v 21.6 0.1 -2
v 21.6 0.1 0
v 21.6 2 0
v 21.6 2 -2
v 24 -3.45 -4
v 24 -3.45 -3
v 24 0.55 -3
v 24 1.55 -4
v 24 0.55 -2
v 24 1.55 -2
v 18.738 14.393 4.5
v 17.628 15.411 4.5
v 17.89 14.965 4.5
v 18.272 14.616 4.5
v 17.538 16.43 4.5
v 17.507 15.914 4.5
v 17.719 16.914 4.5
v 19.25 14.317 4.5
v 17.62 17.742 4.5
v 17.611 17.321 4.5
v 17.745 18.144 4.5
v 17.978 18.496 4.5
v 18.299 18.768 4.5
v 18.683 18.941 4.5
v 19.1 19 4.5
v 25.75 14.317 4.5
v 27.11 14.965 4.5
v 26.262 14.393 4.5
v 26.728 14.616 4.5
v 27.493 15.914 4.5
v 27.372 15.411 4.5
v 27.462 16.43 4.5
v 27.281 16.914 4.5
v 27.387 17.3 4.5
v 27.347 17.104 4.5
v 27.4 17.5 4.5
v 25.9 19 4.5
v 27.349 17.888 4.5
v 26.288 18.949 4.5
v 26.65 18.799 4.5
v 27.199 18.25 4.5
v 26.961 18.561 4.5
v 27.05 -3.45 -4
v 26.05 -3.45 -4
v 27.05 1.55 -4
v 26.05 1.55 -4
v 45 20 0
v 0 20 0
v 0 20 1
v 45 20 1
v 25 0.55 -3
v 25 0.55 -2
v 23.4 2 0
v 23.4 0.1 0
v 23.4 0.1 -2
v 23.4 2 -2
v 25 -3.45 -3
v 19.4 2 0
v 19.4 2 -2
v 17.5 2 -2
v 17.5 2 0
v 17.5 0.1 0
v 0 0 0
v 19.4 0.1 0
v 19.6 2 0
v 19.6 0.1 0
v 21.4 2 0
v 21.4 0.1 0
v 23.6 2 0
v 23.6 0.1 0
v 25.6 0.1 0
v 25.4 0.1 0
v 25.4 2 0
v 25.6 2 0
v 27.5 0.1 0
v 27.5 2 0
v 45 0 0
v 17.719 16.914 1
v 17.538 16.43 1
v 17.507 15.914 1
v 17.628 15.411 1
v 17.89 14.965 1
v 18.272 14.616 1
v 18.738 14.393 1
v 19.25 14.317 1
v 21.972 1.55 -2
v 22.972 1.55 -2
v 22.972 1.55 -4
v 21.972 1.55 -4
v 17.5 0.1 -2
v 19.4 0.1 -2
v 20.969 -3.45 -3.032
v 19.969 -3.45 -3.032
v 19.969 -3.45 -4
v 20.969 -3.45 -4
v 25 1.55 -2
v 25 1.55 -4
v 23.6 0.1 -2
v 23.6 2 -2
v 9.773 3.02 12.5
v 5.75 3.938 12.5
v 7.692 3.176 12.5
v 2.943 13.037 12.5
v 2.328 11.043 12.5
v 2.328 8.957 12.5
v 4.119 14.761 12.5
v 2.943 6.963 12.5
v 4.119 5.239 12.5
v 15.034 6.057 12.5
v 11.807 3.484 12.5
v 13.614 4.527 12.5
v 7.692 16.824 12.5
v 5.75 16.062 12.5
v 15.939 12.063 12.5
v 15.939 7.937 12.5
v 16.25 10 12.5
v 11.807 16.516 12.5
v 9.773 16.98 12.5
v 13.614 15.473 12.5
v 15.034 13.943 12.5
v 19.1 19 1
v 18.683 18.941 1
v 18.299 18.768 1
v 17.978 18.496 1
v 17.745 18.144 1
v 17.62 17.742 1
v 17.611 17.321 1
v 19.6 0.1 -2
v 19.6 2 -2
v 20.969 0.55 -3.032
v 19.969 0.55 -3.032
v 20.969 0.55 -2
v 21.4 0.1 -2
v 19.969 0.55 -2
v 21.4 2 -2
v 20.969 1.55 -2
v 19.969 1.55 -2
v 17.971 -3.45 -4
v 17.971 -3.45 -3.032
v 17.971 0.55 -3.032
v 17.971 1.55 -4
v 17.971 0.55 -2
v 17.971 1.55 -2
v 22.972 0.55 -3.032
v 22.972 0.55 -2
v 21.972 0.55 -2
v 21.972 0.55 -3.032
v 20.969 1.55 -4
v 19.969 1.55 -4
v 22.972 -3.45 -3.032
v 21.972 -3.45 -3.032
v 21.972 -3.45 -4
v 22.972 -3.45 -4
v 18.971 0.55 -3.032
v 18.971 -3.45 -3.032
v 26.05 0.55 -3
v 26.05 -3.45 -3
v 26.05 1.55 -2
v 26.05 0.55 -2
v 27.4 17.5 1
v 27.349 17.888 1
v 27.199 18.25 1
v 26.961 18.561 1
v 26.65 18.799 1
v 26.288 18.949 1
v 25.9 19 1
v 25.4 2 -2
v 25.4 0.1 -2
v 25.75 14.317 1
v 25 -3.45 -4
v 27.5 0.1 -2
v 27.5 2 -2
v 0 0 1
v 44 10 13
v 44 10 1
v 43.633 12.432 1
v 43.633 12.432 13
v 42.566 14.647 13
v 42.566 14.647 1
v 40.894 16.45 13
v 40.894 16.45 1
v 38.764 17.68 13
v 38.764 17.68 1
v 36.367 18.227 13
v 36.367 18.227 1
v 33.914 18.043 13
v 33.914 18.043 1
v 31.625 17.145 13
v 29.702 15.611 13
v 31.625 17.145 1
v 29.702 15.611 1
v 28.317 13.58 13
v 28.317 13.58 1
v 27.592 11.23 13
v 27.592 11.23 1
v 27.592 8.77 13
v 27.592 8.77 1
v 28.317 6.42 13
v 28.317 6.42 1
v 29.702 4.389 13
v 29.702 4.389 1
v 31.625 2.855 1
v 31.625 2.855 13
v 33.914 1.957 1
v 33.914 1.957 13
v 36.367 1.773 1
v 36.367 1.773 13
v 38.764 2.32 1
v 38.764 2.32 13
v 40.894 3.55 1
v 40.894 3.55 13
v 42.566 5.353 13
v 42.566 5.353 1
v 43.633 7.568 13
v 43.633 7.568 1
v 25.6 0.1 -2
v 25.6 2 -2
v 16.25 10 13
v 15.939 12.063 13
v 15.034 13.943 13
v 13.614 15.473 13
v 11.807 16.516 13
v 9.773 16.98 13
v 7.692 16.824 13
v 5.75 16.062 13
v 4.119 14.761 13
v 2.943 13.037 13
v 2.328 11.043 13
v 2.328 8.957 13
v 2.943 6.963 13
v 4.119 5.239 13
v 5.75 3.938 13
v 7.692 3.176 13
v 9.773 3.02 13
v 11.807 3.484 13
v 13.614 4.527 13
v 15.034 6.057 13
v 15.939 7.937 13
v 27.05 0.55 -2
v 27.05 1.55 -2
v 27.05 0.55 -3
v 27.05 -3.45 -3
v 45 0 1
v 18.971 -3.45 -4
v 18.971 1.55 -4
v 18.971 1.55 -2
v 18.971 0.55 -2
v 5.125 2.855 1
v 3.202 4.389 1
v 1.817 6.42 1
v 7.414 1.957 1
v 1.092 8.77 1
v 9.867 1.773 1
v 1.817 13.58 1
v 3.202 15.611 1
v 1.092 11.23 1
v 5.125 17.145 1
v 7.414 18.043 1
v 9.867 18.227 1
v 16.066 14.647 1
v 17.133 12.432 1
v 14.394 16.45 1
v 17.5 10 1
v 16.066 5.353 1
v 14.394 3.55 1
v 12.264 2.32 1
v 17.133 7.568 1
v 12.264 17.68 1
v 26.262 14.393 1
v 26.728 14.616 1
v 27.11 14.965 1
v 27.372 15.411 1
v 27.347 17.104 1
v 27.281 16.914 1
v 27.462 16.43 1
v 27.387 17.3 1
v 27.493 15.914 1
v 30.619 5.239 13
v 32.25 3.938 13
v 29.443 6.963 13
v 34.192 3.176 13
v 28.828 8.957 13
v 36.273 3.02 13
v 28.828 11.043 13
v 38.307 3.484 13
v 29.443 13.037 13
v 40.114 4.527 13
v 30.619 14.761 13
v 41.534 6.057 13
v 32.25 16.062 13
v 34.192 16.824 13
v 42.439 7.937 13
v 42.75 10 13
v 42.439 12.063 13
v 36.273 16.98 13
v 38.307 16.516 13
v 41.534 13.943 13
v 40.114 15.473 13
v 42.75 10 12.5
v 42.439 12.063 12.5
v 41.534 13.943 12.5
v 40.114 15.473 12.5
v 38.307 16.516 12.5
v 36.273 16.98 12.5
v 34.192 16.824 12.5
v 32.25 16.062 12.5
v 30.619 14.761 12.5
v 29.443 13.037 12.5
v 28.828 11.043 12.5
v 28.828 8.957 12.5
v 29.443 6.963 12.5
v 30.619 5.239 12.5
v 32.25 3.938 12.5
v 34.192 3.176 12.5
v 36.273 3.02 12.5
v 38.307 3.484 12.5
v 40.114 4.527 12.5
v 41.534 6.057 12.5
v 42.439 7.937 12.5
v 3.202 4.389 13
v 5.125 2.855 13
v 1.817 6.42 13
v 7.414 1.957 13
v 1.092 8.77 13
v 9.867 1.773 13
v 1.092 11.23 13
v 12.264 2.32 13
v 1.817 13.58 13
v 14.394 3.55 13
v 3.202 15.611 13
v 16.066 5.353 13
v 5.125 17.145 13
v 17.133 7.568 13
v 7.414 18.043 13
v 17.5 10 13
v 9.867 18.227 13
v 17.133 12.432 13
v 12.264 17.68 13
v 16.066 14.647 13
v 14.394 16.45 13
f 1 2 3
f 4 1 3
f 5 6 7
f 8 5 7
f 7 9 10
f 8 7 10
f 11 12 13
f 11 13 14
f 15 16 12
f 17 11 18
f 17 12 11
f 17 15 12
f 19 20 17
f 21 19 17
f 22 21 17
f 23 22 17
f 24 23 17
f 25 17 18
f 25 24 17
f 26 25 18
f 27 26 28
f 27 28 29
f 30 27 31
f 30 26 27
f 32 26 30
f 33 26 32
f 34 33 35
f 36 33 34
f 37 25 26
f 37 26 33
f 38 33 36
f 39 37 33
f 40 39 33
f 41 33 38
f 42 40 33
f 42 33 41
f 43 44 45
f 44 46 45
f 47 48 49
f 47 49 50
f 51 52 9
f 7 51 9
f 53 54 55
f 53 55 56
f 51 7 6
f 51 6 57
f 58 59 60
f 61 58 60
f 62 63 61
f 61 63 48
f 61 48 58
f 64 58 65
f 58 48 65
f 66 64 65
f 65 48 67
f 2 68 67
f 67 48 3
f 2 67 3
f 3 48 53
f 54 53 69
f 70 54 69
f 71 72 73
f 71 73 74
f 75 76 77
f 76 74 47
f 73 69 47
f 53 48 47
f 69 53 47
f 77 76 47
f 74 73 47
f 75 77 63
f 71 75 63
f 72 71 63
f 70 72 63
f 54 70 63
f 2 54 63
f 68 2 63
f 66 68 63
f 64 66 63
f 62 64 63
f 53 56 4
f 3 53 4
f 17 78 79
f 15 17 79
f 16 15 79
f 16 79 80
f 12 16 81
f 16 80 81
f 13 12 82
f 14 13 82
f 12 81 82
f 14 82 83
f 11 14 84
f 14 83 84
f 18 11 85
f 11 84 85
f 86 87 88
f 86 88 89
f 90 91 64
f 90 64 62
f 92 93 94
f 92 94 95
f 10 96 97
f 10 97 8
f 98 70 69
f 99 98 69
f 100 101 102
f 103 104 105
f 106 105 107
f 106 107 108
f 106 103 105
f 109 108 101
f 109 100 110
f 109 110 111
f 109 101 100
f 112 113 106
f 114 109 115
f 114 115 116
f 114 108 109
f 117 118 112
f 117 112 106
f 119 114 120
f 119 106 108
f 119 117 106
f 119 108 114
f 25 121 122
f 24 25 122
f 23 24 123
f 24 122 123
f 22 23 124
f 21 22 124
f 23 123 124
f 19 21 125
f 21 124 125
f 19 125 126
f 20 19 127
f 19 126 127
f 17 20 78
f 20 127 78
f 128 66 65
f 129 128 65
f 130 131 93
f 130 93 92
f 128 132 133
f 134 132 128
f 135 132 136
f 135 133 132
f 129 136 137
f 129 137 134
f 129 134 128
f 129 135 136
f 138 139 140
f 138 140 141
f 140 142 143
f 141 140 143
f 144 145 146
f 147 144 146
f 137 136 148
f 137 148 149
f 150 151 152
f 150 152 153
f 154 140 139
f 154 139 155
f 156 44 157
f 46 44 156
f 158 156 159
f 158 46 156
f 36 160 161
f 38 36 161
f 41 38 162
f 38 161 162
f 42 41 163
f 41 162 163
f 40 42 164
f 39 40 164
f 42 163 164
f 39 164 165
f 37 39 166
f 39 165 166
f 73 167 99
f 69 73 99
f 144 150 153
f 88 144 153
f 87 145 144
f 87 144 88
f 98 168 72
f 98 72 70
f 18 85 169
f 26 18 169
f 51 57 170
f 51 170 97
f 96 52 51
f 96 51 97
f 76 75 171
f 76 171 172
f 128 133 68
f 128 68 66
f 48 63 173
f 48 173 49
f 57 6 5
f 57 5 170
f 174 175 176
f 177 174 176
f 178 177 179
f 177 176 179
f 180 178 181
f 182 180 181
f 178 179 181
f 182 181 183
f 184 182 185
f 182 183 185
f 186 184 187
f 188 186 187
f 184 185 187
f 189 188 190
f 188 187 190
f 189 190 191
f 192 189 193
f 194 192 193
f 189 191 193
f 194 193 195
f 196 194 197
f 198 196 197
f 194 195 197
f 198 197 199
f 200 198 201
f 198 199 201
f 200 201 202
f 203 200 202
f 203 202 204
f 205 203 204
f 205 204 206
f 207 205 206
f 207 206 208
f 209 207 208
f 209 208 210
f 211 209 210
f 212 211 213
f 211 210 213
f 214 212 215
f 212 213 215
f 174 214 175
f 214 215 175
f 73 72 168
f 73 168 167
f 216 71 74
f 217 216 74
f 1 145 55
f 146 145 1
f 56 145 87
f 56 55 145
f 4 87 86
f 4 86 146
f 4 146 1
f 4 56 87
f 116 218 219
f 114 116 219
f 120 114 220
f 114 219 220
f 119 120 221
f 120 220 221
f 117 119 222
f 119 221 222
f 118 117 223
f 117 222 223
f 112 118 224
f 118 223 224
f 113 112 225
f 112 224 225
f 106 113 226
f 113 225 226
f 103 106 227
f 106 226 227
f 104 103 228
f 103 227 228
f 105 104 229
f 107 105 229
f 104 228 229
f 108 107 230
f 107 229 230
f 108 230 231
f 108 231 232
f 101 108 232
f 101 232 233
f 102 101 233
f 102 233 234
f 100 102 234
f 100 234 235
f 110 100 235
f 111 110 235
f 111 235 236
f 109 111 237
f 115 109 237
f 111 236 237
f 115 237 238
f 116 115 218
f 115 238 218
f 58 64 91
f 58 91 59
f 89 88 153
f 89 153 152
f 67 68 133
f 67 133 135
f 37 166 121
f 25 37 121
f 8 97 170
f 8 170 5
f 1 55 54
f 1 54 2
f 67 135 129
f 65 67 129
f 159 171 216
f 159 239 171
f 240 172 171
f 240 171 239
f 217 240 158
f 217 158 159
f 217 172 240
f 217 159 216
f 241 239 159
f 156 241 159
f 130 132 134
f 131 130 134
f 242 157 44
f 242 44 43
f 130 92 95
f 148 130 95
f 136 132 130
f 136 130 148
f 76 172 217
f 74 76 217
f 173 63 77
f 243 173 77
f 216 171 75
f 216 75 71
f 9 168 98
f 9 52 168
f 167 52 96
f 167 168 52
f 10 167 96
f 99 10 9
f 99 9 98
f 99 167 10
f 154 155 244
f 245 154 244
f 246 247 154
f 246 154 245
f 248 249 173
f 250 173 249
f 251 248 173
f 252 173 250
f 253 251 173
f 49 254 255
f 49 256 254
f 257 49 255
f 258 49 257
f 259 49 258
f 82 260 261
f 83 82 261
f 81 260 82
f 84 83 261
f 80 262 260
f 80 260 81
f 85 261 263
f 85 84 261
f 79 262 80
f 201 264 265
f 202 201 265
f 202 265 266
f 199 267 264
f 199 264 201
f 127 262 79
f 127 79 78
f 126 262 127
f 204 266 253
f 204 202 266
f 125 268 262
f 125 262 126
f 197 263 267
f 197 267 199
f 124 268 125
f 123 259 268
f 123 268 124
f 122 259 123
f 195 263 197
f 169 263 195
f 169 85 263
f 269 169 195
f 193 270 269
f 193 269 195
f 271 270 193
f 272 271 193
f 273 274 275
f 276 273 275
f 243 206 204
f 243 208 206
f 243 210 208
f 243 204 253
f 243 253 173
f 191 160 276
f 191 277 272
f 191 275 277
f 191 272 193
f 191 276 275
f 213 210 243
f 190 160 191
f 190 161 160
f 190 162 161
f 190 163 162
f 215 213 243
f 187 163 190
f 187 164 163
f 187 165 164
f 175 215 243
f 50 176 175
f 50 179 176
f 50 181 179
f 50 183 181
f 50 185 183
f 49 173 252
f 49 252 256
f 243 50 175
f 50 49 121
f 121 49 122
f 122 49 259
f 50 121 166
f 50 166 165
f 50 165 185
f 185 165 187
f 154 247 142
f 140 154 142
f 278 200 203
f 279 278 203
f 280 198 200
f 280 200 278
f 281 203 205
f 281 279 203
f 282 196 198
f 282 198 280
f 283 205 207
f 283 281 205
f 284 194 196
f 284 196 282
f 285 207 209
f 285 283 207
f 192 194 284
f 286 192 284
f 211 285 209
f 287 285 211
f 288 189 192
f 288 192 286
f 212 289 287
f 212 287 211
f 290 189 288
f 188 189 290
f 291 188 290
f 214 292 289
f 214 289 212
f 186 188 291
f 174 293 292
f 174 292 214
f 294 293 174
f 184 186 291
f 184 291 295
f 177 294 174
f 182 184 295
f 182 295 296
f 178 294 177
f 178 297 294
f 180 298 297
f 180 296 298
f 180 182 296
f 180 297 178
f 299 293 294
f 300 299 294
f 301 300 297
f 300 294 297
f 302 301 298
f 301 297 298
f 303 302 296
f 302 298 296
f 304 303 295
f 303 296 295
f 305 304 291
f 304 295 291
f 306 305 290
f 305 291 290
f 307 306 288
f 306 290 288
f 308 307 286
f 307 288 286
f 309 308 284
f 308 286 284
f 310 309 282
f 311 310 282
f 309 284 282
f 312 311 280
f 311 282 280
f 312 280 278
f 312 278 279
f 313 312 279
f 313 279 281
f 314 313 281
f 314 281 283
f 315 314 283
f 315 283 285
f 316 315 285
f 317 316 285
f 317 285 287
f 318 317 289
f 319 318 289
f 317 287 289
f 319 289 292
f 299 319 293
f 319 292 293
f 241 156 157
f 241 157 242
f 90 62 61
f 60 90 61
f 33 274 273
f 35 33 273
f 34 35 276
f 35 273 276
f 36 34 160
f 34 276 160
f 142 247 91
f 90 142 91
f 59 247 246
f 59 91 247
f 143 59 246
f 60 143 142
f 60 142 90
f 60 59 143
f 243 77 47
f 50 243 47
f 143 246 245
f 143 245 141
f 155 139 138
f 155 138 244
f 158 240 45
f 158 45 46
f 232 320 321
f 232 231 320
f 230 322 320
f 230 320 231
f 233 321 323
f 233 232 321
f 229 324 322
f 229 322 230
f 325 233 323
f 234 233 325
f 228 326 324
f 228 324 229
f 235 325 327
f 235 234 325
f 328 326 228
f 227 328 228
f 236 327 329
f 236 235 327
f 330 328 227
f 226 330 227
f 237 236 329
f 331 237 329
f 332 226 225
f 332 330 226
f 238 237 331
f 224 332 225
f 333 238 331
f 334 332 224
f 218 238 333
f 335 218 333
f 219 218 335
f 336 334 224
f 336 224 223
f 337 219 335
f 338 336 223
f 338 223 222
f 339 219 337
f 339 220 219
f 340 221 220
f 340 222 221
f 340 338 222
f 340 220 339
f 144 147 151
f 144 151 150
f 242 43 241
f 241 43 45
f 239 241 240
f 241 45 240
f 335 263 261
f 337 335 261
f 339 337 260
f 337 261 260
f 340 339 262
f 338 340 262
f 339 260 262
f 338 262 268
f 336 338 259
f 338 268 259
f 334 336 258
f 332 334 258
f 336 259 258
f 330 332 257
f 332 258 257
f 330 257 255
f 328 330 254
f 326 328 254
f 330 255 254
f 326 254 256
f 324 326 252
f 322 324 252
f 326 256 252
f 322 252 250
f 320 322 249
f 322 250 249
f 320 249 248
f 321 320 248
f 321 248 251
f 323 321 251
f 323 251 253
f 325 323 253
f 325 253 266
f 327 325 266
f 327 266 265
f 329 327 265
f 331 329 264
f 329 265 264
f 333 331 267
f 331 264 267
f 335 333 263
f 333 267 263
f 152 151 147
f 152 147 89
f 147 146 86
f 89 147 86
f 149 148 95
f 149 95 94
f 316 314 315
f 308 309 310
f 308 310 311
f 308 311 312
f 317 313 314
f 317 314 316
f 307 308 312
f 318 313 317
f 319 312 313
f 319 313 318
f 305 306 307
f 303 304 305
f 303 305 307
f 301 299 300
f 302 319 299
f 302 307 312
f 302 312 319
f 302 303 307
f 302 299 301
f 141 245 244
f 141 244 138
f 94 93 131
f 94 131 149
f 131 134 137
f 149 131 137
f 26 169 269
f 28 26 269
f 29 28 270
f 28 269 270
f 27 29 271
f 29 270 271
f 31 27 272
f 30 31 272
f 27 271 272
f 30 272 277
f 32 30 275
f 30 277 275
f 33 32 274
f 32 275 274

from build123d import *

# Parameters (mm, degrees)
ESBO_O1_W                = 45
ESBO_O1_H                = 20
RESSALTO_EXTRUS_O1_DEPTH = 1
ESBO_O2_R                = 8.25
RESSALTO_EXTRUS_O2_DEPTH = 12
ESBO_O3_R                = 7
CORTE_EXTRUS_O1_DEPTH    = 0.5
RESSALTO_EXTRUS_O5_DEPTH = 3.5
ESBO_O7_W                = 1.9
ESBO_O7_H                = 2
ESBO_O7_W_2              = 1.8
RESSALTO_EXTRUS_O6_DEPTH = 2
ESBO_O9_W                = 10
ESBO_O9_H                = 0.1
CORTE_EXTRUS_O2_DEPTH    = 2
ESBO_O10_W               = 1
ESBO_O10_H               = 1
RESSALTO_EXTRUS_O7_DEPTH = 2
ESBO_O11_W               = 1
ESBO_O11_H               = 1
ESBO_O11_H_2             = 0.967747288
RESSALTO_EXTRUS_O8_DEPTH = 4
RESSALTO_EXTRUS_O3_DEPTH = 3.5


with BuildPart() as part:
    # Esboço1 → Ressalto-extrusão1 (new body)
    with BuildSketch(Plane.XY):
        with Locations((22.5, 10)):
            Rectangle(ESBO_O1_W, ESBO_O1_H)
    extrude(amount=RESSALTO_EXTRUS_O1_DEPTH)

    # Esboço2 → Ressalto-extrusão2 (add)
    with BuildSketch(Plane.XY.offset(1)):
        with Locations((9.25, 10)):
            Circle(ESBO_O2_R)
        with Locations((35.75, 10)):
            Circle(ESBO_O2_R)
    extrude(amount=RESSALTO_EXTRUS_O2_DEPTH)

    # Esboço3 → Corte-extrusão1 (cut)
    with BuildSketch(Plane.XY.offset(13)):
        with Locations((9.25, 10)):
            Circle(ESBO_O3_R)
        with Locations((35.75, 10)):
            Circle(ESBO_O3_R)
    extrude(amount=-CORTE_EXTRUS_O1_DEPTH, mode=Mode.SUBTRACT)

    # Esboço6 → Ressalto-extrusão5 (add)
    with BuildSketch(Plane.XY.offset(1)):
        with BuildLine():
            Line((25.75, 17.816758405), (19.25, 17.816758405))
            ThreePointArc((19.25, 17.816758405), (17.5, 16.066758405), (19.25, 14.316758405))
            Line((19.25, 14.316758405), (25.75, 14.316758405))
            ThreePointArc((25.75, 14.316758405), (27.5, 16.066758405), (25.75, 17.816758405))
        make_face()
    extrude(amount=RESSALTO_EXTRUS_O5_DEPTH)

    # Esboço7 → Ressalto-extrusão6 (add)
    with BuildSketch(Plane(origin=(0, 0, 0), x_dir=(-1, 0, 0), z_dir=(0, 0, -1))):
        with Locations((-26.55, 1)):
            Rectangle(ESBO_O7_W, ESBO_O7_H)
        with Locations((-24.5, 1)):
            Rectangle(ESBO_O7_W_2, ESBO_O7_H)
        with Locations((-22.5, 1)):
            Rectangle(ESBO_O7_W_2, ESBO_O7_H)
        with Locations((-20.5, 1)):
            Rectangle(ESBO_O7_W_2, ESBO_O7_H)
        with Locations((-18.45, 1)):
            Rectangle(ESBO_O7_W, ESBO_O7_H)
    extrude(amount=RESSALTO_EXTRUS_O6_DEPTH)

    # Esboço9 → Corte-extrusão2 (cut)
    with BuildSketch(Plane(origin=(0, 0, -2), x_dir=(-1, 0, 0), z_dir=(0, 0, -1))):
        with Locations((-22.5, 0.05)):
            Rectangle(ESBO_O9_W, ESBO_O9_H)
    extrude(amount=-CORTE_EXTRUS_O2_DEPTH, mode=Mode.SUBTRACT)

    # Esboço10 → Ressalto-extrusão7 (add)
    with BuildSketch(Plane(origin=(0, 0, -2), x_dir=(-1, 0, 0), z_dir=(0, 0, -1))):
        with Locations((-24.5, 1.05)):
            Rectangle(ESBO_O10_W, ESBO_O10_H)
        with Locations((-26.55, 1.05)):
            Rectangle(ESBO_O10_W, ESBO_O10_H)
        with Locations((-22.472435469, 1.05)):
            Rectangle(ESBO_O10_W, ESBO_O10_H)
        with Locations((-20.46939422, 1.05)):
            Rectangle(ESBO_O10_W, ESBO_O10_H)
        with Locations((-18.471440092, 1.05)):
            Rectangle(ESBO_O10_W, ESBO_O10_H)
    extrude(amount=RESSALTO_EXTRUS_O7_DEPTH)

    # Esboço11 → Ressalto-extrusão8 (add)
    with BuildSketch(Plane.XZ.offset(-0.55)):
        with Locations((26.55, -3.5)):
            Rectangle(ESBO_O11_W, ESBO_O11_H)
        with Locations((24.5, -3.5)):
            Rectangle(ESBO_O11_W, ESBO_O11_H)
        with Locations((22.472435469, -3.516126356)):
            Rectangle(ESBO_O11_W, ESBO_O11_H_2)
        with Locations((20.46939422, -3.516126356)):
            Rectangle(ESBO_O11_W, ESBO_O11_H_2)
        with Locations((18.471440092, -3.516126356)):
            Rectangle(ESBO_O11_W, ESBO_O11_H_2)
    extrude(amount=RESSALTO_EXTRUS_O8_DEPTH)

    # Esboço4 → Ressalto-extrusão3 (add)
    with BuildSketch(Plane.XY.offset(1)):
        with BuildLine():
            ThreePointArc((20.566173289, 17.816758405), (20.042035666, 18.667291225), (19.1, 19))
            ThreePointArc((19.1, 19), (17.849334275, 18.328151704), (17.719012065, 16.914446994))
            ThreePointArc((17.719012065, 16.914446994), (18.361449222, 17.574398122), (19.25, 17.816758405))
            Line((19.25, 17.816758405), (20.566173289, 17.816758405))
        make_face()
        with BuildLine():
            ThreePointArc((20.6, 17.5), (20.591519348, 17.659279733), (20.566173289, 17.816758405))
            Line((20.566173289, 17.816758405), (19.25, 17.816758405))
            ThreePointArc((19.25, 17.816758405), (18.361449222, 17.574398122), (17.719012065, 16.914446994))
            ThreePointArc((17.719012065, 16.914446994), (18.271848296, 16.249334275), (19.1, 16))
            ThreePointArc((19.1, 16), (20.160660172, 16.439339828), (20.6, 17.5))
        make_face()
        with BuildLine():
            Line((25.9, 19), (19.1, 19))
            ThreePointArc((19.1, 19), (20.042035666, 18.667291225), (20.566173289, 17.816758405))
            Line((20.566173289, 17.816758405), (24.433826711, 17.816758405))
            ThreePointArc((24.433826711, 17.816758405), (24.957964334, 18.667291225), (25.9, 19))
        make_face()
        with BuildLine():
            ThreePointArc((27.4, 17.5), (26.960660172, 18.560660172), (25.9, 19))
            ThreePointArc((25.9, 19), (24.957964334, 18.667291225), (24.433826711, 17.816758405))
            Line((24.433826711, 17.816758405), (25.75, 17.816758405))
            ThreePointArc((25.75, 17.816758405), (26.638550778, 17.574398122), (27.280987935, 16.914446994))
            ThreePointArc((27.280987935, 16.914446994), (27.369945901, 17.201237471), (27.4, 17.5))
        make_face()
        with BuildLine():
            Line((25.75, 17.816758405), (24.433826711, 17.816758405))
            ThreePointArc((24.433826711, 17.816758405), (24.732708775, 16.557964334), (25.9, 16))
            ThreePointArc((25.9, 16), (26.728151704, 16.249334275), (27.280987935, 16.914446994))
            ThreePointArc((27.280987935, 16.914446994), (26.638550778, 17.574398122), (25.75, 17.816758405))
        make_face()
        with BuildLine():
            Line((24.433826711, 17.816758405), (20.566173289, 17.816758405))
            ThreePointArc((20.566173289, 17.816758405), (20.591519348, 17.659279733), (20.6, 17.5))
            ThreePointArc((20.6, 17.5), (20.160660172, 16.439339828), (19.1, 16))
            Line((19.1, 16), (25.9, 16))
            ThreePointArc((25.9, 16), (24.732708775, 16.557964334), (24.433826711, 17.816758405))
        make_face()
    extrude(amount=RESSALTO_EXTRUS_O3_DEPTH)


solid = part.part
